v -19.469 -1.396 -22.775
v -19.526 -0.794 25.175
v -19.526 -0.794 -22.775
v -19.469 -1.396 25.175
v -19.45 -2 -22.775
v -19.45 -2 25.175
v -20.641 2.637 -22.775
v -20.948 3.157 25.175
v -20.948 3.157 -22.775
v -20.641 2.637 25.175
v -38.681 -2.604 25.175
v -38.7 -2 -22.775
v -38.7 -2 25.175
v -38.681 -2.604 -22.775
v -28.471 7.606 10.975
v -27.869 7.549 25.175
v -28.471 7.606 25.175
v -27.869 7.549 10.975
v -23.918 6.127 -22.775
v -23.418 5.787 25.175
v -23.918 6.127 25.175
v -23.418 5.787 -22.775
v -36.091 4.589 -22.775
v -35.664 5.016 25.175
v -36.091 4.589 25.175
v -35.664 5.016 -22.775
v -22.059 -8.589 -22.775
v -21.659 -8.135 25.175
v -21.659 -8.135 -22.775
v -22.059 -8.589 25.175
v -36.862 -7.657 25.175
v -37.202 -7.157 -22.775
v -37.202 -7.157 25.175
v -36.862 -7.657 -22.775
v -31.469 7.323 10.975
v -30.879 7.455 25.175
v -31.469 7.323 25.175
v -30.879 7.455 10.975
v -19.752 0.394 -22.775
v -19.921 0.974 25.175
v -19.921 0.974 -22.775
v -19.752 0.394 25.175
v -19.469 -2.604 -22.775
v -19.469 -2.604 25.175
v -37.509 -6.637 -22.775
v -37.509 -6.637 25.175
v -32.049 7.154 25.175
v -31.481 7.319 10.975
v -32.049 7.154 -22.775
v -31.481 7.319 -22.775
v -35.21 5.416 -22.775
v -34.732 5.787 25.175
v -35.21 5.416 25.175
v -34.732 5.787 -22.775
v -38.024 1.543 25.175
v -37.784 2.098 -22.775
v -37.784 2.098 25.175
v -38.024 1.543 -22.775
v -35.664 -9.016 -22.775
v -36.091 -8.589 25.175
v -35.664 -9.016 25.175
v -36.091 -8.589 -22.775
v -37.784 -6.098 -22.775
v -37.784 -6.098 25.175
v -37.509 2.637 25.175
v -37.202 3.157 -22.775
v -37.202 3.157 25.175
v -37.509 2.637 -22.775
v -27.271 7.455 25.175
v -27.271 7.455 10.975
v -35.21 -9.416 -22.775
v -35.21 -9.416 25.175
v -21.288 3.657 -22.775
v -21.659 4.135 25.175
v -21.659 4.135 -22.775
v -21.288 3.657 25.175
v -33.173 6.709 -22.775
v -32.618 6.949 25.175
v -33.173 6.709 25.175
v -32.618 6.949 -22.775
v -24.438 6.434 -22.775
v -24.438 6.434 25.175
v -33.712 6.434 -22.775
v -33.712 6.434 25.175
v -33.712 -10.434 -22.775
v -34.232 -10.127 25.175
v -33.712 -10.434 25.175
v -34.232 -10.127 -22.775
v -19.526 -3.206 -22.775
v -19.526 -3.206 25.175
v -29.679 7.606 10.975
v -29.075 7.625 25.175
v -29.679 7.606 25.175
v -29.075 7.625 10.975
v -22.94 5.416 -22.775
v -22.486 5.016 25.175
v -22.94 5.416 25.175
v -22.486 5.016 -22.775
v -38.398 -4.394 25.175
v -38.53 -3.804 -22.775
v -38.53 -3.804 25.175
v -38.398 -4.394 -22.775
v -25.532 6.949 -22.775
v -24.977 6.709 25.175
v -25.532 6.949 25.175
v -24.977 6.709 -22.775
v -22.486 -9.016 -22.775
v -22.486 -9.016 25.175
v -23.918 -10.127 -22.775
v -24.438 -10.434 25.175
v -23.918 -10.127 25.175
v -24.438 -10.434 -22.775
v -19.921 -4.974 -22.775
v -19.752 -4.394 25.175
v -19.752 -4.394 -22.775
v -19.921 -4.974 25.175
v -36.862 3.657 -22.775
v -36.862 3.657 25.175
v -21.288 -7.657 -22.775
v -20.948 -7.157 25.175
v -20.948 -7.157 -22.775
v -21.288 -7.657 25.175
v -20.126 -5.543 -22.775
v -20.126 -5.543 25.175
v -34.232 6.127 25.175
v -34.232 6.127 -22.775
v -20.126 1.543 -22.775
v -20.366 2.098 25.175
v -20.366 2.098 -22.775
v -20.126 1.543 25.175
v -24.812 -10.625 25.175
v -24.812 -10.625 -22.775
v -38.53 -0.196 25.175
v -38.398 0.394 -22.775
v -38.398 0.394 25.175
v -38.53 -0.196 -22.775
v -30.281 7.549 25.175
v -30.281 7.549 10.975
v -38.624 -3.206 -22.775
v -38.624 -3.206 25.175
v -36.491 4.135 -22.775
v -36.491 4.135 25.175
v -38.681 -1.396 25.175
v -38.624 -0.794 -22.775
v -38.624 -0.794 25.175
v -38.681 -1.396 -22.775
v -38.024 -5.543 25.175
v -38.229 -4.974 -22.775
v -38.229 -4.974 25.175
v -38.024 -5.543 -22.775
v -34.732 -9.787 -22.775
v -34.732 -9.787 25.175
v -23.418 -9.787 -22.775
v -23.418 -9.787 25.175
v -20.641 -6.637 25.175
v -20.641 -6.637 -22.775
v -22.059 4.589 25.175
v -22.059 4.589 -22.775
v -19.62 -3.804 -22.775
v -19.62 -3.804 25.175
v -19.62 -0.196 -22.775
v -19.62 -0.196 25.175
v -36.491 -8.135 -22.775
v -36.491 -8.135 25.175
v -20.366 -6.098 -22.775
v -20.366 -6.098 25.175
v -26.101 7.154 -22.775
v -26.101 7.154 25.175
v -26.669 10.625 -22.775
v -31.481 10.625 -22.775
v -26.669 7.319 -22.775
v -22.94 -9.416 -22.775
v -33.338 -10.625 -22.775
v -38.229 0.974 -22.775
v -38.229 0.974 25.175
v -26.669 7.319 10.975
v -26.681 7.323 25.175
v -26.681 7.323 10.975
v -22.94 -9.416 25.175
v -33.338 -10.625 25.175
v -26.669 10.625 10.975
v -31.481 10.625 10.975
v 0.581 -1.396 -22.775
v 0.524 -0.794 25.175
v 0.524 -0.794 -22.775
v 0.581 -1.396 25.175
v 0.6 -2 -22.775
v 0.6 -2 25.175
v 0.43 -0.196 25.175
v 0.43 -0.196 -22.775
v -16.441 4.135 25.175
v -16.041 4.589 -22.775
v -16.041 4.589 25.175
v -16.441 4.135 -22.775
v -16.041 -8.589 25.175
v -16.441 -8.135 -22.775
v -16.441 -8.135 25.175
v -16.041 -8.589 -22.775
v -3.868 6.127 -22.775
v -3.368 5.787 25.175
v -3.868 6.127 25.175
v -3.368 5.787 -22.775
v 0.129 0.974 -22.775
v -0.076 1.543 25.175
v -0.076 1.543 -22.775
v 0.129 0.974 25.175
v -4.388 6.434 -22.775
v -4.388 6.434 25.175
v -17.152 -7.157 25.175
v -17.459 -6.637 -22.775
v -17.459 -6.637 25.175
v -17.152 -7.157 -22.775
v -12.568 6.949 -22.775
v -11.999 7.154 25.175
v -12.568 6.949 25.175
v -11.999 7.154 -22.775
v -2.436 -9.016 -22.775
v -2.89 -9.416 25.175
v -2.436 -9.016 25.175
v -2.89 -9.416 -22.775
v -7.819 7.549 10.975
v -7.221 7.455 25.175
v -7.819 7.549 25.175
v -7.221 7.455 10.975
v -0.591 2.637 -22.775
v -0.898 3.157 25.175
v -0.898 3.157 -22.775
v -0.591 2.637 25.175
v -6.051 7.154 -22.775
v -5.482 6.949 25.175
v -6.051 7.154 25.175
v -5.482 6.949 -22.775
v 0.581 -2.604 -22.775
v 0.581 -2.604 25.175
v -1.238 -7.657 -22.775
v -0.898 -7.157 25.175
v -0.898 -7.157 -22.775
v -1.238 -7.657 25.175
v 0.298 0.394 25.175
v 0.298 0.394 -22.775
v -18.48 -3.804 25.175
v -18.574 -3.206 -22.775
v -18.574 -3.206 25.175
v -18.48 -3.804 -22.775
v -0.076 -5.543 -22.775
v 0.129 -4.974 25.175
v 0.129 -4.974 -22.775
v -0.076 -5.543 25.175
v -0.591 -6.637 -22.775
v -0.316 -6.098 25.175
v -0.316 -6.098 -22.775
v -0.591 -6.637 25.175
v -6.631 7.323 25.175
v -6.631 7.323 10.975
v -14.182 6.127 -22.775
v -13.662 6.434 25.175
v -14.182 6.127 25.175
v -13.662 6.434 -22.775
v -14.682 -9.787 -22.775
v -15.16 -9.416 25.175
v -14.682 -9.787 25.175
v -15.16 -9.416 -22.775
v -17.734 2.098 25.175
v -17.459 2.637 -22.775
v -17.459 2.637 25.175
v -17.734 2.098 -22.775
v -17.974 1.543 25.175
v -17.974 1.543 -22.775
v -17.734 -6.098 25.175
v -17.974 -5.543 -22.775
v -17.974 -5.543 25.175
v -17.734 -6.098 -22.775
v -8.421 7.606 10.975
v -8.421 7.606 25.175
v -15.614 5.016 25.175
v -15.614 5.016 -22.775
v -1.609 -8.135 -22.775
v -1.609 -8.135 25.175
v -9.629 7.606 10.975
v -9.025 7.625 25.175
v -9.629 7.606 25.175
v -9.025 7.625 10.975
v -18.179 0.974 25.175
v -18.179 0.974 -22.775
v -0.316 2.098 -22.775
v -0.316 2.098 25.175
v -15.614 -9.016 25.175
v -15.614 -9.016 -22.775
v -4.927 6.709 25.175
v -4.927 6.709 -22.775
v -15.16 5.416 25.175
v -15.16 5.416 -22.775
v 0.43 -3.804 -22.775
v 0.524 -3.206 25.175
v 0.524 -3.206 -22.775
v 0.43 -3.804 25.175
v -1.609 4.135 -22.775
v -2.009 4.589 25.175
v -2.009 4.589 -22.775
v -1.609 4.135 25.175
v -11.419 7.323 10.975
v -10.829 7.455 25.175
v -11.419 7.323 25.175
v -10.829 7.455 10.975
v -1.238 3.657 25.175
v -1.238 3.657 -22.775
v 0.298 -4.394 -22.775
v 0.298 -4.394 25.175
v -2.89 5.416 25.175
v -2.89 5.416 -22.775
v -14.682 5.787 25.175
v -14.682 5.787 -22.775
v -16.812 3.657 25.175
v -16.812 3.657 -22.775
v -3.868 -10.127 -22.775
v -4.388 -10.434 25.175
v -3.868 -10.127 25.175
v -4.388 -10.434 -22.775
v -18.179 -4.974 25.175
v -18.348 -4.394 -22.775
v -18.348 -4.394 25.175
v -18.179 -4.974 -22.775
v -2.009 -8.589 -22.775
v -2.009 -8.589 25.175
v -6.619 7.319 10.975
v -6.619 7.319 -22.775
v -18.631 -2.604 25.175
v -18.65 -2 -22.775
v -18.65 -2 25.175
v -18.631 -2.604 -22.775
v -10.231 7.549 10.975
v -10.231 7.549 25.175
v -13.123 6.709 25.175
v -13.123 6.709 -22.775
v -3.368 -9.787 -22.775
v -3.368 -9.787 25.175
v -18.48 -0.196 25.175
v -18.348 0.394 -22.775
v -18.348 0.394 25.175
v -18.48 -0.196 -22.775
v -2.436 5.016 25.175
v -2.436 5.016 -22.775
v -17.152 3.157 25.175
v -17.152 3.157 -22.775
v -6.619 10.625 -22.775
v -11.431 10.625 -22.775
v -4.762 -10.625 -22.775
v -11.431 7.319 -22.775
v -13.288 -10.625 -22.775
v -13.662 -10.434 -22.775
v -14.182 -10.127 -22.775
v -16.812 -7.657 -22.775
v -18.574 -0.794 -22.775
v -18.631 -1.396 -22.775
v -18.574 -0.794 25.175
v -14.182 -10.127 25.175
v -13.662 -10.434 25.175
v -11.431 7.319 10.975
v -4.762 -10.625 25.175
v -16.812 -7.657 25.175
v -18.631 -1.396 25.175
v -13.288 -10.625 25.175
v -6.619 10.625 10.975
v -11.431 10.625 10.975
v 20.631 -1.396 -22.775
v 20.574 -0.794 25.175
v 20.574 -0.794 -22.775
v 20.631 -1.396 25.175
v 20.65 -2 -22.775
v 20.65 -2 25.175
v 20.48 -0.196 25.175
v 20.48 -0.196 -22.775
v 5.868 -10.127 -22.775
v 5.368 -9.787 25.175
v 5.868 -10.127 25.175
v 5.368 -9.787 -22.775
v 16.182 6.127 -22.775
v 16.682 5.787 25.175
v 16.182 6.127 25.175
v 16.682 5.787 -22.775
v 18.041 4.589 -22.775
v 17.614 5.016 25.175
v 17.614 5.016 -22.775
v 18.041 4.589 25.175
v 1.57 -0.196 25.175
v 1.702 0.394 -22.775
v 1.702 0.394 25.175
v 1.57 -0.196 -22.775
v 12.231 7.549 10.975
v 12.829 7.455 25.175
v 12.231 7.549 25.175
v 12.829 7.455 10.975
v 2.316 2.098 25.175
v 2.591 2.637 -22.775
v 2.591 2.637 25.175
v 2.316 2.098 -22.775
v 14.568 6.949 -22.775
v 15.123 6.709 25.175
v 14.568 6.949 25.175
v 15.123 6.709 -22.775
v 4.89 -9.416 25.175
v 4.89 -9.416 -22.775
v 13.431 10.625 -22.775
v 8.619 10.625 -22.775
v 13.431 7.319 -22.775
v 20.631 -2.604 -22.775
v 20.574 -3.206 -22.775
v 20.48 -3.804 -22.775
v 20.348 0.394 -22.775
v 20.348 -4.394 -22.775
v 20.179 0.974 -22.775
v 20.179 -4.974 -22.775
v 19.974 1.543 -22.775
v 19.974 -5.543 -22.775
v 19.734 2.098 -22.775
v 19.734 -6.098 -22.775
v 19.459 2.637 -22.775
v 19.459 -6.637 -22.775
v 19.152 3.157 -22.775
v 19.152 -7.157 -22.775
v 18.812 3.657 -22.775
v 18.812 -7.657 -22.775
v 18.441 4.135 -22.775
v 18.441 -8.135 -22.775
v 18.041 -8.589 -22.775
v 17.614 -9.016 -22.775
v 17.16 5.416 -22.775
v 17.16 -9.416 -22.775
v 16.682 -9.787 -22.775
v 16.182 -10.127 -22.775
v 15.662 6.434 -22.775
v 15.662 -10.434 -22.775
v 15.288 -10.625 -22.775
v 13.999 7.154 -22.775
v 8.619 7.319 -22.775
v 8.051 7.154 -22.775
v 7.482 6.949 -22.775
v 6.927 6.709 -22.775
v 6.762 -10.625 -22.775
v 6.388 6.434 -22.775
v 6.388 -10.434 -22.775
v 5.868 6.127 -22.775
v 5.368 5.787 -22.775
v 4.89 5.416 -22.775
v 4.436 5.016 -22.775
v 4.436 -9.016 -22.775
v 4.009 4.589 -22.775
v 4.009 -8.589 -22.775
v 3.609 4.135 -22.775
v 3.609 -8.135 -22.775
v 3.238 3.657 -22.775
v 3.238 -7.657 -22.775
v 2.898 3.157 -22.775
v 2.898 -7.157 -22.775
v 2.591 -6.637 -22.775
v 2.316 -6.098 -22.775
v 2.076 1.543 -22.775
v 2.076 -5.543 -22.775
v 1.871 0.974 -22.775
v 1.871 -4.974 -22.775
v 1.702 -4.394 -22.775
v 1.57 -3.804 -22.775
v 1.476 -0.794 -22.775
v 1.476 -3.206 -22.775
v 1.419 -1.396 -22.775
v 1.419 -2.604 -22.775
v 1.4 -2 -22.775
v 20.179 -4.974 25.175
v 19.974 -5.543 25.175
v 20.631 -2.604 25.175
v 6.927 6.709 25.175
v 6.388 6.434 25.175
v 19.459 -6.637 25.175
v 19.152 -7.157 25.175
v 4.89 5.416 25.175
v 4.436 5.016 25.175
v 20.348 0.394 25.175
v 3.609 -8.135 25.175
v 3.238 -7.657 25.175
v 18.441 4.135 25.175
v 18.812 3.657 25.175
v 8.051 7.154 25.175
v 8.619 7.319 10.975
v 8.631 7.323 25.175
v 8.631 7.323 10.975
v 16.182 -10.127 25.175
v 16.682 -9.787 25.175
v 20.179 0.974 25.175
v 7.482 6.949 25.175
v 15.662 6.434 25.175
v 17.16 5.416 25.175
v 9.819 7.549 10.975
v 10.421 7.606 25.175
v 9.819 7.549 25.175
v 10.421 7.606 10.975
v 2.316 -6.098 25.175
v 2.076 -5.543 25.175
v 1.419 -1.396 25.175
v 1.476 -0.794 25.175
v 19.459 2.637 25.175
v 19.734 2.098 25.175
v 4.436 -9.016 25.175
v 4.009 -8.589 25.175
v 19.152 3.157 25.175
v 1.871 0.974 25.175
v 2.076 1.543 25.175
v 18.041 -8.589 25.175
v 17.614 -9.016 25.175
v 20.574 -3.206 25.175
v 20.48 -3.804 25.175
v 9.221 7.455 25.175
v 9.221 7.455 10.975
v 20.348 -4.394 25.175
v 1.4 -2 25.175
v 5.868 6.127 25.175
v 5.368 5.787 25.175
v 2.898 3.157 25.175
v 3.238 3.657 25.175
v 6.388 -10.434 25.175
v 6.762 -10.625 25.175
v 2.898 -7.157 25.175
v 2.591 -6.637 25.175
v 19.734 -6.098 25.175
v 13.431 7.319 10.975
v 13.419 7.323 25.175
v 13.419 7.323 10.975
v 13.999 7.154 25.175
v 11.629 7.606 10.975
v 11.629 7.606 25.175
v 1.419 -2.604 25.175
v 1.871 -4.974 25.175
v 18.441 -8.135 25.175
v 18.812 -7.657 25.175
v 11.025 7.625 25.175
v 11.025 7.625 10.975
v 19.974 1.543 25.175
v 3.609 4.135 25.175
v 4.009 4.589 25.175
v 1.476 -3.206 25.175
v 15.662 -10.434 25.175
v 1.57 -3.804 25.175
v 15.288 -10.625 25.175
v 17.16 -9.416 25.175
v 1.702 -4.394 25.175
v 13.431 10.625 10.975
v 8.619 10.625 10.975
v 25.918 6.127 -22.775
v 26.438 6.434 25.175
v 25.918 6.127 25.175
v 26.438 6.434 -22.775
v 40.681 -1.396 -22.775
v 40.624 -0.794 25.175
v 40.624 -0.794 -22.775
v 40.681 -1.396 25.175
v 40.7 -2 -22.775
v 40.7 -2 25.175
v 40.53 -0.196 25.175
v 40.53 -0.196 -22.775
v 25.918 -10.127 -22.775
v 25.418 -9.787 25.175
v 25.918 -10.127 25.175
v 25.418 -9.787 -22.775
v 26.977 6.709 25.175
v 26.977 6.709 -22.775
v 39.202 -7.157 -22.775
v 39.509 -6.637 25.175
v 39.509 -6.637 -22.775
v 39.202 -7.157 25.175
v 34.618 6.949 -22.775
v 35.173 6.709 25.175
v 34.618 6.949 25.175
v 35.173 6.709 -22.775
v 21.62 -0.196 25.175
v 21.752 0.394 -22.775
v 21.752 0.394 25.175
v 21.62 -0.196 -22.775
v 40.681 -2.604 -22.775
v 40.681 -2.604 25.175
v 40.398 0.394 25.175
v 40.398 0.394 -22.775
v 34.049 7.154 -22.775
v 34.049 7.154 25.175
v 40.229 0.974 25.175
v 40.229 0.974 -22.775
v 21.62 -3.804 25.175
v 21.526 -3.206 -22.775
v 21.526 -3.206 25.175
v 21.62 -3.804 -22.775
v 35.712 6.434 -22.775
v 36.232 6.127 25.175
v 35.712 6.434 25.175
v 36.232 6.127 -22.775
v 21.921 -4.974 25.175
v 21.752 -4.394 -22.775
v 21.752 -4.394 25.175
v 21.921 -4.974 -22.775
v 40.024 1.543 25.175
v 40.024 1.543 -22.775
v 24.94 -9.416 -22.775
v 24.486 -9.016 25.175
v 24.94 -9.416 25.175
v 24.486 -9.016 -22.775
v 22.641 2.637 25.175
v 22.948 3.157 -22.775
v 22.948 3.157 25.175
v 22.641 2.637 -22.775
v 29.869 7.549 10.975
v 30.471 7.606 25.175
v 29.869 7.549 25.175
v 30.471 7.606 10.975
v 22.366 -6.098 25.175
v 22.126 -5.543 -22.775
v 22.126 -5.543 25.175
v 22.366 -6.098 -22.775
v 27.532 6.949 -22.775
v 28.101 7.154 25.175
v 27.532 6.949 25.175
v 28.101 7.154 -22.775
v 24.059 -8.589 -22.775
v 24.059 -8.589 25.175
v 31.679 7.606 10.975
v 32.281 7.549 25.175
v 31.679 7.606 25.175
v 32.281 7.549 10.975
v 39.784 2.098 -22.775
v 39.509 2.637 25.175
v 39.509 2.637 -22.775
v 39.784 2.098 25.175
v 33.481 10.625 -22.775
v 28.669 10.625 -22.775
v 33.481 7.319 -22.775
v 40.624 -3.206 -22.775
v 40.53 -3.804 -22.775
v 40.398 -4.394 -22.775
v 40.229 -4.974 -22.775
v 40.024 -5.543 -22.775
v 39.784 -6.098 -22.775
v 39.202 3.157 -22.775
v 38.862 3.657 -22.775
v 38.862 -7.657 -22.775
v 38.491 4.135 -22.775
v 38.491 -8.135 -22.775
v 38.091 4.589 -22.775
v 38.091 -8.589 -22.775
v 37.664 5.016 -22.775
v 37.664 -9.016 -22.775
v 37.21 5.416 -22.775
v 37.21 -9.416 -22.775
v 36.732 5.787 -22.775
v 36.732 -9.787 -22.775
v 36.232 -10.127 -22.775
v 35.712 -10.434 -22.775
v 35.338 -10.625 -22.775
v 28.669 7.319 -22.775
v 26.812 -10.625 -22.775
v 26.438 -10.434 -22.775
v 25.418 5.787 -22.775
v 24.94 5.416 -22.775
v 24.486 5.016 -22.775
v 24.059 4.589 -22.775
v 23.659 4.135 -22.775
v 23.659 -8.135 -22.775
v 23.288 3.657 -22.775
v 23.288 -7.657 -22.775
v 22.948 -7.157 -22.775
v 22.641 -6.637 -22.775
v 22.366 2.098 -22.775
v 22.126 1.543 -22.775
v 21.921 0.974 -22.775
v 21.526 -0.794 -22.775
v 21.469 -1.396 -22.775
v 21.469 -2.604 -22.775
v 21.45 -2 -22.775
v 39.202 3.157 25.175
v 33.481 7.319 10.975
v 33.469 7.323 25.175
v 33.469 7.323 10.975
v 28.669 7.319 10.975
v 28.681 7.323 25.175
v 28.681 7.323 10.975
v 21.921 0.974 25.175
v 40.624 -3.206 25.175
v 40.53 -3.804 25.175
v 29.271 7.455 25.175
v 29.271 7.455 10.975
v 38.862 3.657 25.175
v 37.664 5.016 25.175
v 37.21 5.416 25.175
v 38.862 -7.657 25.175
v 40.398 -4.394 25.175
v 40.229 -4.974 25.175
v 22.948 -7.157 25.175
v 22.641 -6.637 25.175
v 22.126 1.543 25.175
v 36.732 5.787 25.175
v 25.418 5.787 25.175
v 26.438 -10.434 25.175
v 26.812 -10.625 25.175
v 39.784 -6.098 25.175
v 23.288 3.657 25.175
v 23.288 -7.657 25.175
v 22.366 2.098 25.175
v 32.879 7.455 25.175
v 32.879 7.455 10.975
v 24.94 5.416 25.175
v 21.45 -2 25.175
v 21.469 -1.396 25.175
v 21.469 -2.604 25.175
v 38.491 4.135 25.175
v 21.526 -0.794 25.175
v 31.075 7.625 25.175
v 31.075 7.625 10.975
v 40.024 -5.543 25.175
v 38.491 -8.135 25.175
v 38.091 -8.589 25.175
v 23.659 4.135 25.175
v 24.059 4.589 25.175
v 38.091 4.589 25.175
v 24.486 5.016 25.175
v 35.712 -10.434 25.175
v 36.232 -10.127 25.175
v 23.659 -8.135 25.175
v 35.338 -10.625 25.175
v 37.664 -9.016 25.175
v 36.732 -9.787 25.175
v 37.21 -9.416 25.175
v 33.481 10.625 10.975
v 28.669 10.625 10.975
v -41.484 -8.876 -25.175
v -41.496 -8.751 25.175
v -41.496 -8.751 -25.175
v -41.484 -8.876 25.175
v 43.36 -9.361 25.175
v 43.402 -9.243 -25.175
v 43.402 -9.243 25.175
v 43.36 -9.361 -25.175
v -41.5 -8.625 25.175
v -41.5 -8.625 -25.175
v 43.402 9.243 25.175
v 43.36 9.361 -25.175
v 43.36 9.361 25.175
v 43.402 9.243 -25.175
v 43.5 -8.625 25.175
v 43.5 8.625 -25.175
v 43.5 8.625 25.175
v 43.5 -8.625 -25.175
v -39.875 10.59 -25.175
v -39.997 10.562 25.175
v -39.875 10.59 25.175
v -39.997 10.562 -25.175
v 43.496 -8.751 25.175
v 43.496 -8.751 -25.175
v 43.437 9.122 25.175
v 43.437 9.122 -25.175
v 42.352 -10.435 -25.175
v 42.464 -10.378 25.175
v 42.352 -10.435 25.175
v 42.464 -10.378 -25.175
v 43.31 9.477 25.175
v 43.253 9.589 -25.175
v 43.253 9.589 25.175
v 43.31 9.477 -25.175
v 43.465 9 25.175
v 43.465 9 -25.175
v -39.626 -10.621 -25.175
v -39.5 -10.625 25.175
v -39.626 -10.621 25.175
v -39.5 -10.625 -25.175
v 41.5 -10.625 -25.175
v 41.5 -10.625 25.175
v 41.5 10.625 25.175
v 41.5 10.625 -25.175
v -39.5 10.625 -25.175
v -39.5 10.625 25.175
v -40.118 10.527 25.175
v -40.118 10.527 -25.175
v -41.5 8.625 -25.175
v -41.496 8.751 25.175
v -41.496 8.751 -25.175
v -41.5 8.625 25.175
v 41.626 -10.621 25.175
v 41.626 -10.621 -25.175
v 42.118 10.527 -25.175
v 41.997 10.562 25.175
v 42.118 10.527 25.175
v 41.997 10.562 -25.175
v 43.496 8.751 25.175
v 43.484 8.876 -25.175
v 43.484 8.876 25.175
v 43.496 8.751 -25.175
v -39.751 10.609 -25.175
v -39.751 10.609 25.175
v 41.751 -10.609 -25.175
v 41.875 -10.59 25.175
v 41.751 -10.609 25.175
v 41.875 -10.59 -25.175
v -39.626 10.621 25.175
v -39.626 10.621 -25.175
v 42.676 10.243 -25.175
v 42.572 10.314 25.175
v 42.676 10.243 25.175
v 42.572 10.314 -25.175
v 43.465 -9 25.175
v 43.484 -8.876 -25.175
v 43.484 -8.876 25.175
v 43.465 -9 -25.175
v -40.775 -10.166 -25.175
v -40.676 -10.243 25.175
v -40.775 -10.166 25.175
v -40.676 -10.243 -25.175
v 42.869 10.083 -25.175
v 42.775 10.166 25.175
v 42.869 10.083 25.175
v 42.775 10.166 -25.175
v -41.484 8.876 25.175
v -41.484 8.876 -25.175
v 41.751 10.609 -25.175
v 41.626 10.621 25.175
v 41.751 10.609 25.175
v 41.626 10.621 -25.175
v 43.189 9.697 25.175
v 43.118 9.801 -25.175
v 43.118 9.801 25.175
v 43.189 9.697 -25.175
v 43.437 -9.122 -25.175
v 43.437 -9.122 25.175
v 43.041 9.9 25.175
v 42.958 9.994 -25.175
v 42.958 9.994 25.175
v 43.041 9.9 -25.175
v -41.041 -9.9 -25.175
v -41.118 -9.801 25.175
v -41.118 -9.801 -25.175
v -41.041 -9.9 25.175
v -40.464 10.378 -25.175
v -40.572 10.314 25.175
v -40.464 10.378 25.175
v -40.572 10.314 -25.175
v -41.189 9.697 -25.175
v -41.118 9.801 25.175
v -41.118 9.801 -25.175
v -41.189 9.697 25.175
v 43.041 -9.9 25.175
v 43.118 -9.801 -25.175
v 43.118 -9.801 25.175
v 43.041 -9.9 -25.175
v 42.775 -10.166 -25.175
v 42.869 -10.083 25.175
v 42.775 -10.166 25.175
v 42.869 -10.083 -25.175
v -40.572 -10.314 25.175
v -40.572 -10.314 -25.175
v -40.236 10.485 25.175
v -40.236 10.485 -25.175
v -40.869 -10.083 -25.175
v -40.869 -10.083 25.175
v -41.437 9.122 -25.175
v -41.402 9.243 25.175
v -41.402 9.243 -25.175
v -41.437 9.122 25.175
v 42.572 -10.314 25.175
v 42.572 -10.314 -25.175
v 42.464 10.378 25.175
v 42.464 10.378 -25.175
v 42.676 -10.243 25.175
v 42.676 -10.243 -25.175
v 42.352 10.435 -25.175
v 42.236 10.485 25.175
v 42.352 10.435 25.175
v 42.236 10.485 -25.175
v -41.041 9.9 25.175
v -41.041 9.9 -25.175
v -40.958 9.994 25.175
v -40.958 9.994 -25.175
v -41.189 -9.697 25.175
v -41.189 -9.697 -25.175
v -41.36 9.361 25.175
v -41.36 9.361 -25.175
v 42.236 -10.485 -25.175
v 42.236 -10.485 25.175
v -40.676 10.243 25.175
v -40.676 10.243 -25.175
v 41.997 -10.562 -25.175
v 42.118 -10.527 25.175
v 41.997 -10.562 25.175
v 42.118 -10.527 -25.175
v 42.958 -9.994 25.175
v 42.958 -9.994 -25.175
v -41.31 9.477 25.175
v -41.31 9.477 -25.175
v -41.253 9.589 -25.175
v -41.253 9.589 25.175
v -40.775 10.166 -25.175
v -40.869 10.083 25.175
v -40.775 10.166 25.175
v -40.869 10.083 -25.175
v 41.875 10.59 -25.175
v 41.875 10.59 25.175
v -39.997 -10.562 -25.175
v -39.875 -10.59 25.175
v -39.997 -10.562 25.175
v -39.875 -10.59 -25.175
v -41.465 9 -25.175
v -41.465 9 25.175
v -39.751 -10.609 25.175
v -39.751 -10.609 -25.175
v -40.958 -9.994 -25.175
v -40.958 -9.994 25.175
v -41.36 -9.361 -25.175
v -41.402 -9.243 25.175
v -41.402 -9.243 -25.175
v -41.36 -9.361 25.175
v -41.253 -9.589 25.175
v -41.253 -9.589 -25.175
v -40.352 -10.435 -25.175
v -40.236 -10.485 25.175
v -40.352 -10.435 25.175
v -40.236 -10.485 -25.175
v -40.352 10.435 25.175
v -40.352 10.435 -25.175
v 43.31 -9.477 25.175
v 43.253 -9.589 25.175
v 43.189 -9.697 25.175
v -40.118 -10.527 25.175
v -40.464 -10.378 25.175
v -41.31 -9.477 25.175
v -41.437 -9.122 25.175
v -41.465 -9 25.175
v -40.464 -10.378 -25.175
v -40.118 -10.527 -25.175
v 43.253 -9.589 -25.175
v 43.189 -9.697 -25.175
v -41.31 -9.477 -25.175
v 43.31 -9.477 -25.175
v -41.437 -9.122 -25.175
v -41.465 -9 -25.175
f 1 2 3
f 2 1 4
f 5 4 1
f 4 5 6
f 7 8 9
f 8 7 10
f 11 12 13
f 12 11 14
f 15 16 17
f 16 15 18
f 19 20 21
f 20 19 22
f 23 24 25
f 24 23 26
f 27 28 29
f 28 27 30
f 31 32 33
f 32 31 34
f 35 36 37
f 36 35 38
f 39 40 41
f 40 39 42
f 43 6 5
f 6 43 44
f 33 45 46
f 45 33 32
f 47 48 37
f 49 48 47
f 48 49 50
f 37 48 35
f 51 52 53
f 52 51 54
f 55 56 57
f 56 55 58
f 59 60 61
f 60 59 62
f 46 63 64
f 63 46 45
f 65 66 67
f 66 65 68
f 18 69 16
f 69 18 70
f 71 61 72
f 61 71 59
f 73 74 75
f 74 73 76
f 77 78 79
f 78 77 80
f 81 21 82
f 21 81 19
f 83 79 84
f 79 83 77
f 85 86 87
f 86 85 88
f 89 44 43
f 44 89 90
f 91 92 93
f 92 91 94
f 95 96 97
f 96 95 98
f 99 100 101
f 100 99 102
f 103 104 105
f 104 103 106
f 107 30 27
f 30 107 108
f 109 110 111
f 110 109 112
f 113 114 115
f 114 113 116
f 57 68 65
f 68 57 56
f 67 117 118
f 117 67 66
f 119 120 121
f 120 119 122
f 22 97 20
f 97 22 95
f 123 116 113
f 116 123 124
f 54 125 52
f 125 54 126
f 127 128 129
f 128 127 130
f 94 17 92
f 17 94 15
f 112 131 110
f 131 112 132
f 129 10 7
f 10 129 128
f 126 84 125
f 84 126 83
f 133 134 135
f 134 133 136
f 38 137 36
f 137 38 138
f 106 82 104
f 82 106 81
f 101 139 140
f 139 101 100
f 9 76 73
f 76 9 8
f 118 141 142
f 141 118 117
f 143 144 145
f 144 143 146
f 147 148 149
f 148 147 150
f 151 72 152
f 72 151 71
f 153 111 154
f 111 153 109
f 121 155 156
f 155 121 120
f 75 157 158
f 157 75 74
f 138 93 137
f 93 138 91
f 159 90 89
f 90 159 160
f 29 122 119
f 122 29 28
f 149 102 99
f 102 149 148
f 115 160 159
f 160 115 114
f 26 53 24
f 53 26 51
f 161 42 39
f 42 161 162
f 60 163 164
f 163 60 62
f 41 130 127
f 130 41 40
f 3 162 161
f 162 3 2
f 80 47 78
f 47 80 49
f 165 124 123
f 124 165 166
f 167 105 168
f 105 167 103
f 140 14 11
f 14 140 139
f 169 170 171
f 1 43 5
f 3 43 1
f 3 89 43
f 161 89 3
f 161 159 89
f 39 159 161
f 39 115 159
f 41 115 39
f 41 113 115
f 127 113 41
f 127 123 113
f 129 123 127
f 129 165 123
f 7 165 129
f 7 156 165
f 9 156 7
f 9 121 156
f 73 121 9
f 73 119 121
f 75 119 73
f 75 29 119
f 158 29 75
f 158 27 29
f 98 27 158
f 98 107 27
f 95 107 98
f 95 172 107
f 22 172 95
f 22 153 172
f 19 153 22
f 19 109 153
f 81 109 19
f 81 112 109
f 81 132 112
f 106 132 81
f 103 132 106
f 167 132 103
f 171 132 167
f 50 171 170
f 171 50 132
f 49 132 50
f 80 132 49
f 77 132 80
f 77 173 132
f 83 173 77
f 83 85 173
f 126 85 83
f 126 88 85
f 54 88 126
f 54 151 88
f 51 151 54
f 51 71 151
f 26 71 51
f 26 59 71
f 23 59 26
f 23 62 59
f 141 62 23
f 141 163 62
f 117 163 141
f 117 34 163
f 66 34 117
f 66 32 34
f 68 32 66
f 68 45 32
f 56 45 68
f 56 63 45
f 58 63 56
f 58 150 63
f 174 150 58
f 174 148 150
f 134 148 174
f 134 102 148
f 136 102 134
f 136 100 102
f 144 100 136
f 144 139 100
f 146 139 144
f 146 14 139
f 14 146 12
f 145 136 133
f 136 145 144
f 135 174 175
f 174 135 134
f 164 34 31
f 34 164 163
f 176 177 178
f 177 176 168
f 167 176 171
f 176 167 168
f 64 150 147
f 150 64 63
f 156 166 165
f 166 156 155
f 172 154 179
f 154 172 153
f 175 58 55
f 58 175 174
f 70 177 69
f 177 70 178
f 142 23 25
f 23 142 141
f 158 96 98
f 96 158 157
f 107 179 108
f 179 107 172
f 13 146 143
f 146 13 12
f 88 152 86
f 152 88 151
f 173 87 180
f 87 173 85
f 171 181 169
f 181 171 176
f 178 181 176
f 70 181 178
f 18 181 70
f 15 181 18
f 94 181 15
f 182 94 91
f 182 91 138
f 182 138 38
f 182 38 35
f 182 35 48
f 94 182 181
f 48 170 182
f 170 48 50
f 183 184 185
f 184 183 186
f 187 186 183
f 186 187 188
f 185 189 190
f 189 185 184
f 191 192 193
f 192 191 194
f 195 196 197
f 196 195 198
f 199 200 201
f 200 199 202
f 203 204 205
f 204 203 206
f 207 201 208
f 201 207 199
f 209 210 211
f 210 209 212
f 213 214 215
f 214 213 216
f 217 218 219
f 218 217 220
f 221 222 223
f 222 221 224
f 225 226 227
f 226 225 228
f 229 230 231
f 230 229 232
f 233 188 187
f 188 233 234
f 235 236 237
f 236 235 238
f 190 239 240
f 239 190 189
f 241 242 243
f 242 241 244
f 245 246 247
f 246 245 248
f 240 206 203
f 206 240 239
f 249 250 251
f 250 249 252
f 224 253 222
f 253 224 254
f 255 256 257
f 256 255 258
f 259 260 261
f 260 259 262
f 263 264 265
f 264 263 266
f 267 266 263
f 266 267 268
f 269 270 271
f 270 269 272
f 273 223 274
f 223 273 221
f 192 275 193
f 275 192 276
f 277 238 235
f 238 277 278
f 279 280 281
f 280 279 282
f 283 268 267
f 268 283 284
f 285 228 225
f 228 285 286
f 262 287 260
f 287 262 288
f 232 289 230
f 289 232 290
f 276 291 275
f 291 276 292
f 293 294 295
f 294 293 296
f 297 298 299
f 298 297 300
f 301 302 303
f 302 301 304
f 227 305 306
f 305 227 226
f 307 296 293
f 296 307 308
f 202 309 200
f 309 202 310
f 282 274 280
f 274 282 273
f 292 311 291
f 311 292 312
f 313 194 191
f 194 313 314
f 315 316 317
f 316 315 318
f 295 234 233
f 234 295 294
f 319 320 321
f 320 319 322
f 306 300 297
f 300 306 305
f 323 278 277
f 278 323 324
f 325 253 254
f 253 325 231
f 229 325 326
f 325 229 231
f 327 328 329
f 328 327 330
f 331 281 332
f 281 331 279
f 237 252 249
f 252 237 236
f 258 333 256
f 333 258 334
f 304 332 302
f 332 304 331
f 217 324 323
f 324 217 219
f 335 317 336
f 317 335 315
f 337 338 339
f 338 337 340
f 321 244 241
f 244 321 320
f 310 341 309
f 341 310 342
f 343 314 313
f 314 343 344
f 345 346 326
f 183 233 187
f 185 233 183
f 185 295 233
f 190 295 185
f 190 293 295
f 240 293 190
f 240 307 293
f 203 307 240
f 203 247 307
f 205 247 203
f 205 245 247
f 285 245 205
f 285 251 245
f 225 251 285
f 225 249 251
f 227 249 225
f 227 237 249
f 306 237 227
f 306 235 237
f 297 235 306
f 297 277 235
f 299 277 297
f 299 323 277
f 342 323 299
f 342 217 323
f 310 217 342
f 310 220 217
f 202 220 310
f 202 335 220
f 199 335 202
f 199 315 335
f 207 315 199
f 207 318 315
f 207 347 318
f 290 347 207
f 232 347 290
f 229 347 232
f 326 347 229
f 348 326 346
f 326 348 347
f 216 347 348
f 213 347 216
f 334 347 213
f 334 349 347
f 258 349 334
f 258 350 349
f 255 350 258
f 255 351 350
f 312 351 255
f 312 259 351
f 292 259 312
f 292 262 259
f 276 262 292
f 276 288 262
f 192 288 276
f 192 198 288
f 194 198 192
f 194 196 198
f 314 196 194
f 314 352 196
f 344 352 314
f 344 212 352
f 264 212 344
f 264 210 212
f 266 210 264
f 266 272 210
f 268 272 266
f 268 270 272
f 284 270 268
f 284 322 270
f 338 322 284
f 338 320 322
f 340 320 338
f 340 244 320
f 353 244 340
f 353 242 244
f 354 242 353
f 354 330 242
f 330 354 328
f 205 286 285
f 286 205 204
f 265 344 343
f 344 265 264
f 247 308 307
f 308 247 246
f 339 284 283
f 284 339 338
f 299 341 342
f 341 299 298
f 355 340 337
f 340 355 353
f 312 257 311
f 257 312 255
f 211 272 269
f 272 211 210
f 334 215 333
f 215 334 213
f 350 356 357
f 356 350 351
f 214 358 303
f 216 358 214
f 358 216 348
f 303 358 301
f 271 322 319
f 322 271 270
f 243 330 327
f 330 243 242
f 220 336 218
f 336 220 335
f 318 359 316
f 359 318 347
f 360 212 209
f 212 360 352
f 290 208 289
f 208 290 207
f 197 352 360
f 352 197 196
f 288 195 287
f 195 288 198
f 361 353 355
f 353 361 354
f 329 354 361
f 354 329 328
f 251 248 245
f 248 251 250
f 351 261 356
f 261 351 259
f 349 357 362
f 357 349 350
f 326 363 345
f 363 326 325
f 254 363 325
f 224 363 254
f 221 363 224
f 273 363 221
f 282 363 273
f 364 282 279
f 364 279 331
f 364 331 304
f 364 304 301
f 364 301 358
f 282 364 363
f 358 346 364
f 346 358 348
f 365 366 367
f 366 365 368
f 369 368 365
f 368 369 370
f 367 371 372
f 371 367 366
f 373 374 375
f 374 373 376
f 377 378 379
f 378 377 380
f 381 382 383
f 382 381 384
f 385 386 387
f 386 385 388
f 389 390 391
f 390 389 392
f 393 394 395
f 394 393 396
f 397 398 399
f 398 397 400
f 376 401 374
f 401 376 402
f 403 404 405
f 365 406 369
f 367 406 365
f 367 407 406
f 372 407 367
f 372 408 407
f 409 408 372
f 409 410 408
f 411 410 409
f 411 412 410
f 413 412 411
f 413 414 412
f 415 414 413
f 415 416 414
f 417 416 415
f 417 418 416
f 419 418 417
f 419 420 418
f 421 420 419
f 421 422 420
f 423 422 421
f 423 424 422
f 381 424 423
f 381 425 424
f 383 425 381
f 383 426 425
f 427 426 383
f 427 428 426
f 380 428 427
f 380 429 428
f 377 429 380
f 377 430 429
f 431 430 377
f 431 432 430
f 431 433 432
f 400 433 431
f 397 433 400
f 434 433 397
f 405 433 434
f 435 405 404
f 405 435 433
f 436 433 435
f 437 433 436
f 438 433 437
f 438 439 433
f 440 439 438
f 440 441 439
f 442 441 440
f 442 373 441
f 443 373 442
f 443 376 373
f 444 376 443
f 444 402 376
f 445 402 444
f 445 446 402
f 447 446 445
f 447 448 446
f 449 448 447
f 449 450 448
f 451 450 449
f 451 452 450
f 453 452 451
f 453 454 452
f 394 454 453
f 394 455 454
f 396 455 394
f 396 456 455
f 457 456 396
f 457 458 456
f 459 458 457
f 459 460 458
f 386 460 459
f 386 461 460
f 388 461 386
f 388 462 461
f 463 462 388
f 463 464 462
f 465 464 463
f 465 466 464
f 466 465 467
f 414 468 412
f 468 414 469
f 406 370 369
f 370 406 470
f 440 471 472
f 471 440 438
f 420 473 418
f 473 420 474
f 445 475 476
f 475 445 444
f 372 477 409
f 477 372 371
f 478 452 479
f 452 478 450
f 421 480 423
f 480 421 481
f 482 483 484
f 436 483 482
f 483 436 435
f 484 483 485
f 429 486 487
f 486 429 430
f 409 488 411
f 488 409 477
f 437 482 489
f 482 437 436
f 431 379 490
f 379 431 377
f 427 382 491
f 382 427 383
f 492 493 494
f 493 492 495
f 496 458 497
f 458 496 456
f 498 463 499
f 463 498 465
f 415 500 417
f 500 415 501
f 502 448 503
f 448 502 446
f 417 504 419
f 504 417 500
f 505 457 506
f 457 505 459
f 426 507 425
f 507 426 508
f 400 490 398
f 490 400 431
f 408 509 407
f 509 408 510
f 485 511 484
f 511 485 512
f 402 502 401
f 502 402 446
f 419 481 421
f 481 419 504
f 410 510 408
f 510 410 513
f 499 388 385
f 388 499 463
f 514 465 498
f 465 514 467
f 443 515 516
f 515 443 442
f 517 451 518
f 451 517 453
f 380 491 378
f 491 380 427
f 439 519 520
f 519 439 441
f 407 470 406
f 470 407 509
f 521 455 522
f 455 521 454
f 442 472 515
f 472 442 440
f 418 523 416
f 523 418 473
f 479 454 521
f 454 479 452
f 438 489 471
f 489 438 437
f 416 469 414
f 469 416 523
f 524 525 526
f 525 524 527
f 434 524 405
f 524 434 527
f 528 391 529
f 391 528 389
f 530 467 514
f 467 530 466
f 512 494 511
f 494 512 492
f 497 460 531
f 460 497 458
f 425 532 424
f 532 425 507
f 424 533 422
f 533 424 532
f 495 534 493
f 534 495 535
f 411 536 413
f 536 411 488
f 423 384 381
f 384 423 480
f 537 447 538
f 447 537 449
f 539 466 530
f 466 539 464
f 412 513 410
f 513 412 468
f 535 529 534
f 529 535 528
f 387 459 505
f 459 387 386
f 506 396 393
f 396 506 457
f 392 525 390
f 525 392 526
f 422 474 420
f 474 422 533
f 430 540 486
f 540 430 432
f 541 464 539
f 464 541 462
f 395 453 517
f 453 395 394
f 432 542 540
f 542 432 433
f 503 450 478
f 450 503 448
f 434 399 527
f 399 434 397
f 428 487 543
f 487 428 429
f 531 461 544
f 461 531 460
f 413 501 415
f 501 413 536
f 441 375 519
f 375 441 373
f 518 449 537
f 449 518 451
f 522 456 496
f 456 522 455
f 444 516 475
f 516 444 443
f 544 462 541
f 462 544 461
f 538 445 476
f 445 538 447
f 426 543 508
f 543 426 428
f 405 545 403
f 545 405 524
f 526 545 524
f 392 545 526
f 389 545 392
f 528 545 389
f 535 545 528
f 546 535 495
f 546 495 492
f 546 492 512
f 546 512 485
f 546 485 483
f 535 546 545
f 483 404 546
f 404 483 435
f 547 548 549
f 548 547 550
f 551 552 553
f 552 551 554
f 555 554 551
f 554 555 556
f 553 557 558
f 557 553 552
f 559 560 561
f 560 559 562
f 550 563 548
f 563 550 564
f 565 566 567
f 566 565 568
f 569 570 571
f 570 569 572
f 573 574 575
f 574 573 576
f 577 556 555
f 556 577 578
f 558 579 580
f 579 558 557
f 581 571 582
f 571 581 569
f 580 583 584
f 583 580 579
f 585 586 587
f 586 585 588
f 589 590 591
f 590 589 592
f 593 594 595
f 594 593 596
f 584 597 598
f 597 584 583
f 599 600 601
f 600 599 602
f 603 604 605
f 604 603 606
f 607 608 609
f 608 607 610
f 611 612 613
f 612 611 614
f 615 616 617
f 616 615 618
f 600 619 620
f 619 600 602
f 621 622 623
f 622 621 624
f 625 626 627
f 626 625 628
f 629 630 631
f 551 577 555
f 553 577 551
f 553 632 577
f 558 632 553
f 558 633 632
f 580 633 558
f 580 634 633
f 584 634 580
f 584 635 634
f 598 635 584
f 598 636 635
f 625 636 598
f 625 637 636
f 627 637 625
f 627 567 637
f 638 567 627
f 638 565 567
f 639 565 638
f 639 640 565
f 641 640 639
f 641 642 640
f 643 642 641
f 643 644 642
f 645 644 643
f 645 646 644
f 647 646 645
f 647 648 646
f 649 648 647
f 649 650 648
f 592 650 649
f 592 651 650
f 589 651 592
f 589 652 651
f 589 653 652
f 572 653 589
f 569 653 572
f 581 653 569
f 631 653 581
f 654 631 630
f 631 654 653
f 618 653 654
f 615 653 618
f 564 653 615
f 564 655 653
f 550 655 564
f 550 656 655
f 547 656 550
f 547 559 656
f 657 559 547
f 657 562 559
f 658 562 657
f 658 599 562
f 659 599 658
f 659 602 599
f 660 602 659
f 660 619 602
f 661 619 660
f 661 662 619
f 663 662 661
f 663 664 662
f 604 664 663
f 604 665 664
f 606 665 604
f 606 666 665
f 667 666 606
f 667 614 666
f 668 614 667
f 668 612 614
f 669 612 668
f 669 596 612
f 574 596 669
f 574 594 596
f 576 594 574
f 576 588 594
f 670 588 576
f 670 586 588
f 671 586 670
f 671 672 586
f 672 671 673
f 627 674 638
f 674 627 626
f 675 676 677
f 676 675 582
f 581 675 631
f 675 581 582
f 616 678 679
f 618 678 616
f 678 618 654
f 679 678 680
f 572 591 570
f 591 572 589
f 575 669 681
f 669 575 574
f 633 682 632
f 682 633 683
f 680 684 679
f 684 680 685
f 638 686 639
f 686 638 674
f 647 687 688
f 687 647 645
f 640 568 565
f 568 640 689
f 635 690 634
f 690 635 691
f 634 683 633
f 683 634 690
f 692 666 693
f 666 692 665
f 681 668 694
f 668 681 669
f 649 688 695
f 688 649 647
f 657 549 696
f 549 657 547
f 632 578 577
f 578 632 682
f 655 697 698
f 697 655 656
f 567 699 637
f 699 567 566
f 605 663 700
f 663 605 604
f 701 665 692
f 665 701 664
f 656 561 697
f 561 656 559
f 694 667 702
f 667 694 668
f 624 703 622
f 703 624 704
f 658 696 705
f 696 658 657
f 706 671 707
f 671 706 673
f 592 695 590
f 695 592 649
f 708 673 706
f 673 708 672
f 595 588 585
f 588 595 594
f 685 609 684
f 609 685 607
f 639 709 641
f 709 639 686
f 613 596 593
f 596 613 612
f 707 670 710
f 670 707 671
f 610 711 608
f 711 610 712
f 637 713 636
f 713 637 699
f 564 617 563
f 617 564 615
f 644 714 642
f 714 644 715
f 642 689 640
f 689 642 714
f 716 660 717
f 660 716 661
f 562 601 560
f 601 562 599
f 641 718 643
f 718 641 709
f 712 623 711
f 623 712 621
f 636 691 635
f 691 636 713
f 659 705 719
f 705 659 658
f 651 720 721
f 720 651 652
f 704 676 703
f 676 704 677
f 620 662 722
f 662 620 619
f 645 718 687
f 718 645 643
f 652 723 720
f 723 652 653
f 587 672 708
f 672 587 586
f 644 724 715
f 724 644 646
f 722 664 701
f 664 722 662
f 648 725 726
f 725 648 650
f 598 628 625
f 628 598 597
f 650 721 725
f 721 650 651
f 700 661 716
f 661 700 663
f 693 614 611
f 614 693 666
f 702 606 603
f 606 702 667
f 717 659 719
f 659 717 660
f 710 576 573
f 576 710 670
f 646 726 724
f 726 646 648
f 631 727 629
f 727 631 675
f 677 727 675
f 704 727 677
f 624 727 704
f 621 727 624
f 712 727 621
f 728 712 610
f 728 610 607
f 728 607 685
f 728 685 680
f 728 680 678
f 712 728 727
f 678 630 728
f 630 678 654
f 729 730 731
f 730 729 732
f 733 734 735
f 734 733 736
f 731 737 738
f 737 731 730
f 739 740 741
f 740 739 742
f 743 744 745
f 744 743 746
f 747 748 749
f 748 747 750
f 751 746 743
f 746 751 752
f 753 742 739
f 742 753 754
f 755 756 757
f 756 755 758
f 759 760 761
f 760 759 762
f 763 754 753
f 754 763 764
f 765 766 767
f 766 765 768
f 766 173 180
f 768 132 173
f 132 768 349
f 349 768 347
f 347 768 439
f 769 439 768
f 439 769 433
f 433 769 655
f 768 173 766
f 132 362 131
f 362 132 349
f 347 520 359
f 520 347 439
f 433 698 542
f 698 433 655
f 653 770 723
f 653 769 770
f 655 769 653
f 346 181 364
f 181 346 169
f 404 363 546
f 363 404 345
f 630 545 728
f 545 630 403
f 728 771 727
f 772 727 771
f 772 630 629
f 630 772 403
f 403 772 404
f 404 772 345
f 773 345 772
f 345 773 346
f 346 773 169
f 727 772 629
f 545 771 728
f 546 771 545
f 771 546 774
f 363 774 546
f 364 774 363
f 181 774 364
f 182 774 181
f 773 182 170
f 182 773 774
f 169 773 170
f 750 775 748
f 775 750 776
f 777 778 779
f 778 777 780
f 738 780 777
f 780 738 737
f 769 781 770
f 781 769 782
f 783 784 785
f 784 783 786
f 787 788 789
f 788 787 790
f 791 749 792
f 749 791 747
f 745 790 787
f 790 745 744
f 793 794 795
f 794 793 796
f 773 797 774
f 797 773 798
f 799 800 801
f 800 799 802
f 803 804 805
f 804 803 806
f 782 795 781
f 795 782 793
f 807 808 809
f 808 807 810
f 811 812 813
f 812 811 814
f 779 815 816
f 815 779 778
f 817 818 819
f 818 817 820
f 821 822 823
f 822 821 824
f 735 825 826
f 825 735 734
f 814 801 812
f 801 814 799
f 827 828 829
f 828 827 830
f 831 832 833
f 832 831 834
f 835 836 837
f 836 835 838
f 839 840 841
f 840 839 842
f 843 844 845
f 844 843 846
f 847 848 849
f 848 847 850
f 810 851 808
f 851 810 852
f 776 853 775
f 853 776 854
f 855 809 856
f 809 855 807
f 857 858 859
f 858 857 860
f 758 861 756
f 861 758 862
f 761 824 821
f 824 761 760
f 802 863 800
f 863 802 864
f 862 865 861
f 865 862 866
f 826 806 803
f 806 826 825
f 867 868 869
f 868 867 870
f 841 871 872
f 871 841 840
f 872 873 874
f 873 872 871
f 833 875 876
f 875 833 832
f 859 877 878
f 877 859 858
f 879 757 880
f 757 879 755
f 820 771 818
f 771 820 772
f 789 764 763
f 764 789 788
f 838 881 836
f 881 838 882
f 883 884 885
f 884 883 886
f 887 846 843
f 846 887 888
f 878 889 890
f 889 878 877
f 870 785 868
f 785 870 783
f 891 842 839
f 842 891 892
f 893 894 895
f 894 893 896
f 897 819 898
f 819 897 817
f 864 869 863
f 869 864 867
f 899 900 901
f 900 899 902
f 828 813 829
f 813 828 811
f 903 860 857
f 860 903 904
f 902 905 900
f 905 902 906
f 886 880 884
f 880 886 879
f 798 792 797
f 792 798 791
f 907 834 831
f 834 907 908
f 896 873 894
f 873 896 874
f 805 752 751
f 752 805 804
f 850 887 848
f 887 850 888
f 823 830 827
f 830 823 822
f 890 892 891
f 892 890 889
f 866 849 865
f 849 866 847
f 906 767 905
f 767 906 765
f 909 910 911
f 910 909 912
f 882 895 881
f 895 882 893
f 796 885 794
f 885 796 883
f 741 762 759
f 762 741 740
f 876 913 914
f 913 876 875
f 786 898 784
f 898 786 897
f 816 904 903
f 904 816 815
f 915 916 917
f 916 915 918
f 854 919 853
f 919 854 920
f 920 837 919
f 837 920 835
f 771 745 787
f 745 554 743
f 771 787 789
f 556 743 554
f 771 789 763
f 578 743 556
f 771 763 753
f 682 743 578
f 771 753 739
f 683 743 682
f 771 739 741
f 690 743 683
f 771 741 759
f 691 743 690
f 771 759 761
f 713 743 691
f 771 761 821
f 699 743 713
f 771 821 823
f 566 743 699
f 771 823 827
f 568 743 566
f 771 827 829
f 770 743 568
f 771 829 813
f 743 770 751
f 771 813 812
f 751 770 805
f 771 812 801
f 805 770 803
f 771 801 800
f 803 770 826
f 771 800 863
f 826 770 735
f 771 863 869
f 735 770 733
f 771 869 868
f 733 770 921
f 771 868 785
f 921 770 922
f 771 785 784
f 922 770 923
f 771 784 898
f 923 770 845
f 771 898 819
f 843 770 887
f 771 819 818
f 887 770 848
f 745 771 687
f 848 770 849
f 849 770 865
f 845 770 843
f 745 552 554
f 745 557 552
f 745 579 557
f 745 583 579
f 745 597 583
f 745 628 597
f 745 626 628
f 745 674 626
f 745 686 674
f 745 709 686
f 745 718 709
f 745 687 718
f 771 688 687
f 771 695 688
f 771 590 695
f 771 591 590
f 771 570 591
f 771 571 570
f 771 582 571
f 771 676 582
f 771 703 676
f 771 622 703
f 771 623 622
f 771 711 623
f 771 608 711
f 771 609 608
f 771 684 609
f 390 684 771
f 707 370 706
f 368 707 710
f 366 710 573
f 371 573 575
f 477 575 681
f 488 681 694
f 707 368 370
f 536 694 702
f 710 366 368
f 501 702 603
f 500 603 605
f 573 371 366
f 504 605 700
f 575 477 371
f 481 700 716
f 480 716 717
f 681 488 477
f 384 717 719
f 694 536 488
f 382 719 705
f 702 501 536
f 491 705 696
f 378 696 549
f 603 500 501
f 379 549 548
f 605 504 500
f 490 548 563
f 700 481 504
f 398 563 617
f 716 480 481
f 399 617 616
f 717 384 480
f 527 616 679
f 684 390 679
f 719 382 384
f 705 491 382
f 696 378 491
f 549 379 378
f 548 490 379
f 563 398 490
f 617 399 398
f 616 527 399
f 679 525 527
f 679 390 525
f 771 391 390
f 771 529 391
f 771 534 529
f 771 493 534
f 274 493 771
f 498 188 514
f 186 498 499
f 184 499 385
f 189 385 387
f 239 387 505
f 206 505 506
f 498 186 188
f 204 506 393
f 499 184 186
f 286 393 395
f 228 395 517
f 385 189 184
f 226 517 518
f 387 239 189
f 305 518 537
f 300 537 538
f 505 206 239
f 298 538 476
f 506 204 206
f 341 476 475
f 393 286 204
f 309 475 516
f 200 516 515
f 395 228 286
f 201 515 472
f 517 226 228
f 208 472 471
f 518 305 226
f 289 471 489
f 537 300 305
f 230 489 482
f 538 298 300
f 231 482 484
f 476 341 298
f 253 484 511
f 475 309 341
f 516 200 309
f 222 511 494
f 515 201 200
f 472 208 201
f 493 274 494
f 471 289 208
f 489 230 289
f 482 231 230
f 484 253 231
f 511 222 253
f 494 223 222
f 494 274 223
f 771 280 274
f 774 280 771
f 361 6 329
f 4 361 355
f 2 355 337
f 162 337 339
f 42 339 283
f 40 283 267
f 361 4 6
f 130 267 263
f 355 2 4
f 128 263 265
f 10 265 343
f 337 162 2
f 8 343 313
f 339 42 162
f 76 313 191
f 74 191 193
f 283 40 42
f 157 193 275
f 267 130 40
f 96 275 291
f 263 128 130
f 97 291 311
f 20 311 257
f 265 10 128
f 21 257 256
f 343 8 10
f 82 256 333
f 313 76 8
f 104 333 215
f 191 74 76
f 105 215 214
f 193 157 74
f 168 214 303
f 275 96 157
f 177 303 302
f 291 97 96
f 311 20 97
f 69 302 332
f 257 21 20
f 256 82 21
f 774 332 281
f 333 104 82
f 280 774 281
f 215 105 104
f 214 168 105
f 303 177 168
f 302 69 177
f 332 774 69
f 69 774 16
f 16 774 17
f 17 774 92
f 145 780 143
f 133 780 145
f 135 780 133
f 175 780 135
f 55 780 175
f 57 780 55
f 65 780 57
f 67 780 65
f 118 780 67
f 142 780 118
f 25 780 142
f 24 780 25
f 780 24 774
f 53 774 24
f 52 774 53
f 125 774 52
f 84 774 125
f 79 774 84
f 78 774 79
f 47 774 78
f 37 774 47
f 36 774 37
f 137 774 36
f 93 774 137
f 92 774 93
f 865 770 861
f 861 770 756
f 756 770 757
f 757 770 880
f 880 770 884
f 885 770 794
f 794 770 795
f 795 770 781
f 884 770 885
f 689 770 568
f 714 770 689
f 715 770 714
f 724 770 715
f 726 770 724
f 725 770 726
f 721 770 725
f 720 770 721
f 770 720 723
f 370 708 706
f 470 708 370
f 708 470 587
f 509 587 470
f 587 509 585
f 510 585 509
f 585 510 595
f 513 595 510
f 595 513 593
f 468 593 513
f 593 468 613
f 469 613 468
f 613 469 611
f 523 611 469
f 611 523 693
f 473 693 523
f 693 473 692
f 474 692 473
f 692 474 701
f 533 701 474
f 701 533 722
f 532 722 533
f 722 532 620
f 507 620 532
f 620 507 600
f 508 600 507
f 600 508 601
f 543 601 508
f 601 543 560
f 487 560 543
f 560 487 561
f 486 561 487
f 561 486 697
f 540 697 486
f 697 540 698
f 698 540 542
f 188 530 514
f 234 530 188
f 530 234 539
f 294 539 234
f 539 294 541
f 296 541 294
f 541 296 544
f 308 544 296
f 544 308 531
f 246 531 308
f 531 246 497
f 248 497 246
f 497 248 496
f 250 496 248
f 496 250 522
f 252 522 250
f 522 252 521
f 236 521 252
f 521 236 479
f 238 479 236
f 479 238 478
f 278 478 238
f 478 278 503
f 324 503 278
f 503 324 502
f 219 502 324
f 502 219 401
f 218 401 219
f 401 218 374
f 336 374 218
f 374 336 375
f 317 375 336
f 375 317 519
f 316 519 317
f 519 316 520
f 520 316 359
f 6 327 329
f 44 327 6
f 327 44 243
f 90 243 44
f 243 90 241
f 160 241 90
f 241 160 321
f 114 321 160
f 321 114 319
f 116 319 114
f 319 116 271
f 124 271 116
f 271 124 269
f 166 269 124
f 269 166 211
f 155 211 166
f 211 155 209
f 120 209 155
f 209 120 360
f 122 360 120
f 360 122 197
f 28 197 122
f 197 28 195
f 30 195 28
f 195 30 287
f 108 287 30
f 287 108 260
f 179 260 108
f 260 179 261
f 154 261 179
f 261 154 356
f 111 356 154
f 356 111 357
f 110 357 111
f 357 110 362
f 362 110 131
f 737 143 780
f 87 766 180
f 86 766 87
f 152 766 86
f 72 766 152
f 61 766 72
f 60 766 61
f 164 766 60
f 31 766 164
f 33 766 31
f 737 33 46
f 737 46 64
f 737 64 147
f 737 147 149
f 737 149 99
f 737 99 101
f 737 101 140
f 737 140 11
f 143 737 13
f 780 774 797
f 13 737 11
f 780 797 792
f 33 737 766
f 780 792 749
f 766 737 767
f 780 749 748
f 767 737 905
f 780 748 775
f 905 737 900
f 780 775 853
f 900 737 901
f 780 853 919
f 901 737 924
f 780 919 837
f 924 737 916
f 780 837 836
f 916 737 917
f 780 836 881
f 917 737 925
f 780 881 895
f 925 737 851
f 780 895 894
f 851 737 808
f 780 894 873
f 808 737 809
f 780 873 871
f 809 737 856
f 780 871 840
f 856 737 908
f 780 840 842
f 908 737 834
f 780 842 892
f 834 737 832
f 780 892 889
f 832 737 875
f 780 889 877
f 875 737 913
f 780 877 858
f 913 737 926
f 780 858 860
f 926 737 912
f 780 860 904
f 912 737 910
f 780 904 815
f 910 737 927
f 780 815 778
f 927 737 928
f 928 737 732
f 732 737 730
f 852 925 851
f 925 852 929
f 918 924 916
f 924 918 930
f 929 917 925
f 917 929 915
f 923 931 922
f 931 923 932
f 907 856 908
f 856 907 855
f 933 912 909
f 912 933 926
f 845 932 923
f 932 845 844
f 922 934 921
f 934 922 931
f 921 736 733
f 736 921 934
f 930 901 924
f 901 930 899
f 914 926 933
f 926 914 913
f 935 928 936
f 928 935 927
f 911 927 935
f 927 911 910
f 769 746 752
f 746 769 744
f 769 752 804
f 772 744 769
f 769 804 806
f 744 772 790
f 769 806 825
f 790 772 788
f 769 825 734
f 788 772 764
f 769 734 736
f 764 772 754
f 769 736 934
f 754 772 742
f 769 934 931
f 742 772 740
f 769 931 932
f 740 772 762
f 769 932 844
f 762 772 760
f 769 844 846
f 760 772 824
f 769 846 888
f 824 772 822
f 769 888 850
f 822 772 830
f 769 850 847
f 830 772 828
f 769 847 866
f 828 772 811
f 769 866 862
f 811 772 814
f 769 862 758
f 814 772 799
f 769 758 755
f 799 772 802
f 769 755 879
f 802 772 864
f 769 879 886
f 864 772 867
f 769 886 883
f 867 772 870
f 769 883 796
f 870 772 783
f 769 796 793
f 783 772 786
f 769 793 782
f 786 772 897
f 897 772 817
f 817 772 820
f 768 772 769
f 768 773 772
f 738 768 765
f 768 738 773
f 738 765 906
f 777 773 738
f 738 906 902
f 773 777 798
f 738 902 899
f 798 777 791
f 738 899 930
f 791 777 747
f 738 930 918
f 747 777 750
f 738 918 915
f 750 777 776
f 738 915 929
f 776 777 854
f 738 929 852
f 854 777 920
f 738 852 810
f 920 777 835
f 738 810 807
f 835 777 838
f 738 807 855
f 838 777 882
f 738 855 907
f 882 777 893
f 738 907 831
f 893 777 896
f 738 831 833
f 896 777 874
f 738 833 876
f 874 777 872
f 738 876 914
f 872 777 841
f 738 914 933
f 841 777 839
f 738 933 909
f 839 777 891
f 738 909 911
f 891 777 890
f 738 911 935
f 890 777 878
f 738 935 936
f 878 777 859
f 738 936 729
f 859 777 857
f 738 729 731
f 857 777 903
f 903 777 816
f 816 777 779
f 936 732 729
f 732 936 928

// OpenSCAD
//Diameter, at the widest, for a standard Pico Squeeze squonk bottle
bottle_diameter = 19.25;

//Length of the bottle cap
bottle_cap_length = 15;

bottle_length = 33.75 + bottle_cap_length;

//How many bottles?
bottle_count = 4; //[1:8]

//The space between each bottle
bottle_spacing = 0.8;

container = [
     bottle_spacing + (bottle_diameter+bottle_spacing)*bottle_count,
     bottle_diameter,
     bottle_length + (bottle_spacing*2)
];

container_rounding_radius = 2 * 1; // * 1 hides this from thingiverse's customizer

//Include rear juice level viewing window?
include_window = 1; //[1:true, 0:false]

module rounded_rectangle(size, radius) {
     x = size[0];
     y = size[1];
     z = size[2];

     linear_extrude(height = z, center = true) hull() {
          translate([(-x/2)+(radius/2), (-y/2)+(radius/2), 0])
               circle(r=radius);
          translate([(x/2)+(radius/2), (-y/2)+(radius/2), 0])
               circle(r=radius);
          translate([(-x/2)+(radius/2), (y/2)-(radius/2), 0])
               circle(r=radius);
          translate([(x/2)+(radius/2), (y/2)-(radius/2), 0])
               circle(r=radius);
     }
}

translate([0,0,0]) {
    difference() {
      rounded_rectangle(container, container_rounding_radius, $fn=100);
      translate([
        -(container.x/2)+(container_rounding_radius/2)+(bottle_spacing+(bottle_diameter/2)),
        -(container_rounding_radius),
        0
      ]) {
          for (bottle = [0:(bottle_count-1)]) {
            translate_vector = [
              (bottle)*(bottle_diameter+bottle_spacing),
              0,
              (bottle_spacing*2)
            ];

            translate(translate_vector) {
              cylinder(
                h = bottle_length,
                d = bottle_diameter,
                $fn = 100,
                center = true
              );
            }

            if (include_window) {
              translate([translate_vector.x, +(bottle_diameter/2), translate_vector.z - (bottle_cap_length/2)])
                cube([(bottle_diameter/4), 10, bottle_length - bottle_cap_length], center = true);
            }
          }
      }
    }
}
